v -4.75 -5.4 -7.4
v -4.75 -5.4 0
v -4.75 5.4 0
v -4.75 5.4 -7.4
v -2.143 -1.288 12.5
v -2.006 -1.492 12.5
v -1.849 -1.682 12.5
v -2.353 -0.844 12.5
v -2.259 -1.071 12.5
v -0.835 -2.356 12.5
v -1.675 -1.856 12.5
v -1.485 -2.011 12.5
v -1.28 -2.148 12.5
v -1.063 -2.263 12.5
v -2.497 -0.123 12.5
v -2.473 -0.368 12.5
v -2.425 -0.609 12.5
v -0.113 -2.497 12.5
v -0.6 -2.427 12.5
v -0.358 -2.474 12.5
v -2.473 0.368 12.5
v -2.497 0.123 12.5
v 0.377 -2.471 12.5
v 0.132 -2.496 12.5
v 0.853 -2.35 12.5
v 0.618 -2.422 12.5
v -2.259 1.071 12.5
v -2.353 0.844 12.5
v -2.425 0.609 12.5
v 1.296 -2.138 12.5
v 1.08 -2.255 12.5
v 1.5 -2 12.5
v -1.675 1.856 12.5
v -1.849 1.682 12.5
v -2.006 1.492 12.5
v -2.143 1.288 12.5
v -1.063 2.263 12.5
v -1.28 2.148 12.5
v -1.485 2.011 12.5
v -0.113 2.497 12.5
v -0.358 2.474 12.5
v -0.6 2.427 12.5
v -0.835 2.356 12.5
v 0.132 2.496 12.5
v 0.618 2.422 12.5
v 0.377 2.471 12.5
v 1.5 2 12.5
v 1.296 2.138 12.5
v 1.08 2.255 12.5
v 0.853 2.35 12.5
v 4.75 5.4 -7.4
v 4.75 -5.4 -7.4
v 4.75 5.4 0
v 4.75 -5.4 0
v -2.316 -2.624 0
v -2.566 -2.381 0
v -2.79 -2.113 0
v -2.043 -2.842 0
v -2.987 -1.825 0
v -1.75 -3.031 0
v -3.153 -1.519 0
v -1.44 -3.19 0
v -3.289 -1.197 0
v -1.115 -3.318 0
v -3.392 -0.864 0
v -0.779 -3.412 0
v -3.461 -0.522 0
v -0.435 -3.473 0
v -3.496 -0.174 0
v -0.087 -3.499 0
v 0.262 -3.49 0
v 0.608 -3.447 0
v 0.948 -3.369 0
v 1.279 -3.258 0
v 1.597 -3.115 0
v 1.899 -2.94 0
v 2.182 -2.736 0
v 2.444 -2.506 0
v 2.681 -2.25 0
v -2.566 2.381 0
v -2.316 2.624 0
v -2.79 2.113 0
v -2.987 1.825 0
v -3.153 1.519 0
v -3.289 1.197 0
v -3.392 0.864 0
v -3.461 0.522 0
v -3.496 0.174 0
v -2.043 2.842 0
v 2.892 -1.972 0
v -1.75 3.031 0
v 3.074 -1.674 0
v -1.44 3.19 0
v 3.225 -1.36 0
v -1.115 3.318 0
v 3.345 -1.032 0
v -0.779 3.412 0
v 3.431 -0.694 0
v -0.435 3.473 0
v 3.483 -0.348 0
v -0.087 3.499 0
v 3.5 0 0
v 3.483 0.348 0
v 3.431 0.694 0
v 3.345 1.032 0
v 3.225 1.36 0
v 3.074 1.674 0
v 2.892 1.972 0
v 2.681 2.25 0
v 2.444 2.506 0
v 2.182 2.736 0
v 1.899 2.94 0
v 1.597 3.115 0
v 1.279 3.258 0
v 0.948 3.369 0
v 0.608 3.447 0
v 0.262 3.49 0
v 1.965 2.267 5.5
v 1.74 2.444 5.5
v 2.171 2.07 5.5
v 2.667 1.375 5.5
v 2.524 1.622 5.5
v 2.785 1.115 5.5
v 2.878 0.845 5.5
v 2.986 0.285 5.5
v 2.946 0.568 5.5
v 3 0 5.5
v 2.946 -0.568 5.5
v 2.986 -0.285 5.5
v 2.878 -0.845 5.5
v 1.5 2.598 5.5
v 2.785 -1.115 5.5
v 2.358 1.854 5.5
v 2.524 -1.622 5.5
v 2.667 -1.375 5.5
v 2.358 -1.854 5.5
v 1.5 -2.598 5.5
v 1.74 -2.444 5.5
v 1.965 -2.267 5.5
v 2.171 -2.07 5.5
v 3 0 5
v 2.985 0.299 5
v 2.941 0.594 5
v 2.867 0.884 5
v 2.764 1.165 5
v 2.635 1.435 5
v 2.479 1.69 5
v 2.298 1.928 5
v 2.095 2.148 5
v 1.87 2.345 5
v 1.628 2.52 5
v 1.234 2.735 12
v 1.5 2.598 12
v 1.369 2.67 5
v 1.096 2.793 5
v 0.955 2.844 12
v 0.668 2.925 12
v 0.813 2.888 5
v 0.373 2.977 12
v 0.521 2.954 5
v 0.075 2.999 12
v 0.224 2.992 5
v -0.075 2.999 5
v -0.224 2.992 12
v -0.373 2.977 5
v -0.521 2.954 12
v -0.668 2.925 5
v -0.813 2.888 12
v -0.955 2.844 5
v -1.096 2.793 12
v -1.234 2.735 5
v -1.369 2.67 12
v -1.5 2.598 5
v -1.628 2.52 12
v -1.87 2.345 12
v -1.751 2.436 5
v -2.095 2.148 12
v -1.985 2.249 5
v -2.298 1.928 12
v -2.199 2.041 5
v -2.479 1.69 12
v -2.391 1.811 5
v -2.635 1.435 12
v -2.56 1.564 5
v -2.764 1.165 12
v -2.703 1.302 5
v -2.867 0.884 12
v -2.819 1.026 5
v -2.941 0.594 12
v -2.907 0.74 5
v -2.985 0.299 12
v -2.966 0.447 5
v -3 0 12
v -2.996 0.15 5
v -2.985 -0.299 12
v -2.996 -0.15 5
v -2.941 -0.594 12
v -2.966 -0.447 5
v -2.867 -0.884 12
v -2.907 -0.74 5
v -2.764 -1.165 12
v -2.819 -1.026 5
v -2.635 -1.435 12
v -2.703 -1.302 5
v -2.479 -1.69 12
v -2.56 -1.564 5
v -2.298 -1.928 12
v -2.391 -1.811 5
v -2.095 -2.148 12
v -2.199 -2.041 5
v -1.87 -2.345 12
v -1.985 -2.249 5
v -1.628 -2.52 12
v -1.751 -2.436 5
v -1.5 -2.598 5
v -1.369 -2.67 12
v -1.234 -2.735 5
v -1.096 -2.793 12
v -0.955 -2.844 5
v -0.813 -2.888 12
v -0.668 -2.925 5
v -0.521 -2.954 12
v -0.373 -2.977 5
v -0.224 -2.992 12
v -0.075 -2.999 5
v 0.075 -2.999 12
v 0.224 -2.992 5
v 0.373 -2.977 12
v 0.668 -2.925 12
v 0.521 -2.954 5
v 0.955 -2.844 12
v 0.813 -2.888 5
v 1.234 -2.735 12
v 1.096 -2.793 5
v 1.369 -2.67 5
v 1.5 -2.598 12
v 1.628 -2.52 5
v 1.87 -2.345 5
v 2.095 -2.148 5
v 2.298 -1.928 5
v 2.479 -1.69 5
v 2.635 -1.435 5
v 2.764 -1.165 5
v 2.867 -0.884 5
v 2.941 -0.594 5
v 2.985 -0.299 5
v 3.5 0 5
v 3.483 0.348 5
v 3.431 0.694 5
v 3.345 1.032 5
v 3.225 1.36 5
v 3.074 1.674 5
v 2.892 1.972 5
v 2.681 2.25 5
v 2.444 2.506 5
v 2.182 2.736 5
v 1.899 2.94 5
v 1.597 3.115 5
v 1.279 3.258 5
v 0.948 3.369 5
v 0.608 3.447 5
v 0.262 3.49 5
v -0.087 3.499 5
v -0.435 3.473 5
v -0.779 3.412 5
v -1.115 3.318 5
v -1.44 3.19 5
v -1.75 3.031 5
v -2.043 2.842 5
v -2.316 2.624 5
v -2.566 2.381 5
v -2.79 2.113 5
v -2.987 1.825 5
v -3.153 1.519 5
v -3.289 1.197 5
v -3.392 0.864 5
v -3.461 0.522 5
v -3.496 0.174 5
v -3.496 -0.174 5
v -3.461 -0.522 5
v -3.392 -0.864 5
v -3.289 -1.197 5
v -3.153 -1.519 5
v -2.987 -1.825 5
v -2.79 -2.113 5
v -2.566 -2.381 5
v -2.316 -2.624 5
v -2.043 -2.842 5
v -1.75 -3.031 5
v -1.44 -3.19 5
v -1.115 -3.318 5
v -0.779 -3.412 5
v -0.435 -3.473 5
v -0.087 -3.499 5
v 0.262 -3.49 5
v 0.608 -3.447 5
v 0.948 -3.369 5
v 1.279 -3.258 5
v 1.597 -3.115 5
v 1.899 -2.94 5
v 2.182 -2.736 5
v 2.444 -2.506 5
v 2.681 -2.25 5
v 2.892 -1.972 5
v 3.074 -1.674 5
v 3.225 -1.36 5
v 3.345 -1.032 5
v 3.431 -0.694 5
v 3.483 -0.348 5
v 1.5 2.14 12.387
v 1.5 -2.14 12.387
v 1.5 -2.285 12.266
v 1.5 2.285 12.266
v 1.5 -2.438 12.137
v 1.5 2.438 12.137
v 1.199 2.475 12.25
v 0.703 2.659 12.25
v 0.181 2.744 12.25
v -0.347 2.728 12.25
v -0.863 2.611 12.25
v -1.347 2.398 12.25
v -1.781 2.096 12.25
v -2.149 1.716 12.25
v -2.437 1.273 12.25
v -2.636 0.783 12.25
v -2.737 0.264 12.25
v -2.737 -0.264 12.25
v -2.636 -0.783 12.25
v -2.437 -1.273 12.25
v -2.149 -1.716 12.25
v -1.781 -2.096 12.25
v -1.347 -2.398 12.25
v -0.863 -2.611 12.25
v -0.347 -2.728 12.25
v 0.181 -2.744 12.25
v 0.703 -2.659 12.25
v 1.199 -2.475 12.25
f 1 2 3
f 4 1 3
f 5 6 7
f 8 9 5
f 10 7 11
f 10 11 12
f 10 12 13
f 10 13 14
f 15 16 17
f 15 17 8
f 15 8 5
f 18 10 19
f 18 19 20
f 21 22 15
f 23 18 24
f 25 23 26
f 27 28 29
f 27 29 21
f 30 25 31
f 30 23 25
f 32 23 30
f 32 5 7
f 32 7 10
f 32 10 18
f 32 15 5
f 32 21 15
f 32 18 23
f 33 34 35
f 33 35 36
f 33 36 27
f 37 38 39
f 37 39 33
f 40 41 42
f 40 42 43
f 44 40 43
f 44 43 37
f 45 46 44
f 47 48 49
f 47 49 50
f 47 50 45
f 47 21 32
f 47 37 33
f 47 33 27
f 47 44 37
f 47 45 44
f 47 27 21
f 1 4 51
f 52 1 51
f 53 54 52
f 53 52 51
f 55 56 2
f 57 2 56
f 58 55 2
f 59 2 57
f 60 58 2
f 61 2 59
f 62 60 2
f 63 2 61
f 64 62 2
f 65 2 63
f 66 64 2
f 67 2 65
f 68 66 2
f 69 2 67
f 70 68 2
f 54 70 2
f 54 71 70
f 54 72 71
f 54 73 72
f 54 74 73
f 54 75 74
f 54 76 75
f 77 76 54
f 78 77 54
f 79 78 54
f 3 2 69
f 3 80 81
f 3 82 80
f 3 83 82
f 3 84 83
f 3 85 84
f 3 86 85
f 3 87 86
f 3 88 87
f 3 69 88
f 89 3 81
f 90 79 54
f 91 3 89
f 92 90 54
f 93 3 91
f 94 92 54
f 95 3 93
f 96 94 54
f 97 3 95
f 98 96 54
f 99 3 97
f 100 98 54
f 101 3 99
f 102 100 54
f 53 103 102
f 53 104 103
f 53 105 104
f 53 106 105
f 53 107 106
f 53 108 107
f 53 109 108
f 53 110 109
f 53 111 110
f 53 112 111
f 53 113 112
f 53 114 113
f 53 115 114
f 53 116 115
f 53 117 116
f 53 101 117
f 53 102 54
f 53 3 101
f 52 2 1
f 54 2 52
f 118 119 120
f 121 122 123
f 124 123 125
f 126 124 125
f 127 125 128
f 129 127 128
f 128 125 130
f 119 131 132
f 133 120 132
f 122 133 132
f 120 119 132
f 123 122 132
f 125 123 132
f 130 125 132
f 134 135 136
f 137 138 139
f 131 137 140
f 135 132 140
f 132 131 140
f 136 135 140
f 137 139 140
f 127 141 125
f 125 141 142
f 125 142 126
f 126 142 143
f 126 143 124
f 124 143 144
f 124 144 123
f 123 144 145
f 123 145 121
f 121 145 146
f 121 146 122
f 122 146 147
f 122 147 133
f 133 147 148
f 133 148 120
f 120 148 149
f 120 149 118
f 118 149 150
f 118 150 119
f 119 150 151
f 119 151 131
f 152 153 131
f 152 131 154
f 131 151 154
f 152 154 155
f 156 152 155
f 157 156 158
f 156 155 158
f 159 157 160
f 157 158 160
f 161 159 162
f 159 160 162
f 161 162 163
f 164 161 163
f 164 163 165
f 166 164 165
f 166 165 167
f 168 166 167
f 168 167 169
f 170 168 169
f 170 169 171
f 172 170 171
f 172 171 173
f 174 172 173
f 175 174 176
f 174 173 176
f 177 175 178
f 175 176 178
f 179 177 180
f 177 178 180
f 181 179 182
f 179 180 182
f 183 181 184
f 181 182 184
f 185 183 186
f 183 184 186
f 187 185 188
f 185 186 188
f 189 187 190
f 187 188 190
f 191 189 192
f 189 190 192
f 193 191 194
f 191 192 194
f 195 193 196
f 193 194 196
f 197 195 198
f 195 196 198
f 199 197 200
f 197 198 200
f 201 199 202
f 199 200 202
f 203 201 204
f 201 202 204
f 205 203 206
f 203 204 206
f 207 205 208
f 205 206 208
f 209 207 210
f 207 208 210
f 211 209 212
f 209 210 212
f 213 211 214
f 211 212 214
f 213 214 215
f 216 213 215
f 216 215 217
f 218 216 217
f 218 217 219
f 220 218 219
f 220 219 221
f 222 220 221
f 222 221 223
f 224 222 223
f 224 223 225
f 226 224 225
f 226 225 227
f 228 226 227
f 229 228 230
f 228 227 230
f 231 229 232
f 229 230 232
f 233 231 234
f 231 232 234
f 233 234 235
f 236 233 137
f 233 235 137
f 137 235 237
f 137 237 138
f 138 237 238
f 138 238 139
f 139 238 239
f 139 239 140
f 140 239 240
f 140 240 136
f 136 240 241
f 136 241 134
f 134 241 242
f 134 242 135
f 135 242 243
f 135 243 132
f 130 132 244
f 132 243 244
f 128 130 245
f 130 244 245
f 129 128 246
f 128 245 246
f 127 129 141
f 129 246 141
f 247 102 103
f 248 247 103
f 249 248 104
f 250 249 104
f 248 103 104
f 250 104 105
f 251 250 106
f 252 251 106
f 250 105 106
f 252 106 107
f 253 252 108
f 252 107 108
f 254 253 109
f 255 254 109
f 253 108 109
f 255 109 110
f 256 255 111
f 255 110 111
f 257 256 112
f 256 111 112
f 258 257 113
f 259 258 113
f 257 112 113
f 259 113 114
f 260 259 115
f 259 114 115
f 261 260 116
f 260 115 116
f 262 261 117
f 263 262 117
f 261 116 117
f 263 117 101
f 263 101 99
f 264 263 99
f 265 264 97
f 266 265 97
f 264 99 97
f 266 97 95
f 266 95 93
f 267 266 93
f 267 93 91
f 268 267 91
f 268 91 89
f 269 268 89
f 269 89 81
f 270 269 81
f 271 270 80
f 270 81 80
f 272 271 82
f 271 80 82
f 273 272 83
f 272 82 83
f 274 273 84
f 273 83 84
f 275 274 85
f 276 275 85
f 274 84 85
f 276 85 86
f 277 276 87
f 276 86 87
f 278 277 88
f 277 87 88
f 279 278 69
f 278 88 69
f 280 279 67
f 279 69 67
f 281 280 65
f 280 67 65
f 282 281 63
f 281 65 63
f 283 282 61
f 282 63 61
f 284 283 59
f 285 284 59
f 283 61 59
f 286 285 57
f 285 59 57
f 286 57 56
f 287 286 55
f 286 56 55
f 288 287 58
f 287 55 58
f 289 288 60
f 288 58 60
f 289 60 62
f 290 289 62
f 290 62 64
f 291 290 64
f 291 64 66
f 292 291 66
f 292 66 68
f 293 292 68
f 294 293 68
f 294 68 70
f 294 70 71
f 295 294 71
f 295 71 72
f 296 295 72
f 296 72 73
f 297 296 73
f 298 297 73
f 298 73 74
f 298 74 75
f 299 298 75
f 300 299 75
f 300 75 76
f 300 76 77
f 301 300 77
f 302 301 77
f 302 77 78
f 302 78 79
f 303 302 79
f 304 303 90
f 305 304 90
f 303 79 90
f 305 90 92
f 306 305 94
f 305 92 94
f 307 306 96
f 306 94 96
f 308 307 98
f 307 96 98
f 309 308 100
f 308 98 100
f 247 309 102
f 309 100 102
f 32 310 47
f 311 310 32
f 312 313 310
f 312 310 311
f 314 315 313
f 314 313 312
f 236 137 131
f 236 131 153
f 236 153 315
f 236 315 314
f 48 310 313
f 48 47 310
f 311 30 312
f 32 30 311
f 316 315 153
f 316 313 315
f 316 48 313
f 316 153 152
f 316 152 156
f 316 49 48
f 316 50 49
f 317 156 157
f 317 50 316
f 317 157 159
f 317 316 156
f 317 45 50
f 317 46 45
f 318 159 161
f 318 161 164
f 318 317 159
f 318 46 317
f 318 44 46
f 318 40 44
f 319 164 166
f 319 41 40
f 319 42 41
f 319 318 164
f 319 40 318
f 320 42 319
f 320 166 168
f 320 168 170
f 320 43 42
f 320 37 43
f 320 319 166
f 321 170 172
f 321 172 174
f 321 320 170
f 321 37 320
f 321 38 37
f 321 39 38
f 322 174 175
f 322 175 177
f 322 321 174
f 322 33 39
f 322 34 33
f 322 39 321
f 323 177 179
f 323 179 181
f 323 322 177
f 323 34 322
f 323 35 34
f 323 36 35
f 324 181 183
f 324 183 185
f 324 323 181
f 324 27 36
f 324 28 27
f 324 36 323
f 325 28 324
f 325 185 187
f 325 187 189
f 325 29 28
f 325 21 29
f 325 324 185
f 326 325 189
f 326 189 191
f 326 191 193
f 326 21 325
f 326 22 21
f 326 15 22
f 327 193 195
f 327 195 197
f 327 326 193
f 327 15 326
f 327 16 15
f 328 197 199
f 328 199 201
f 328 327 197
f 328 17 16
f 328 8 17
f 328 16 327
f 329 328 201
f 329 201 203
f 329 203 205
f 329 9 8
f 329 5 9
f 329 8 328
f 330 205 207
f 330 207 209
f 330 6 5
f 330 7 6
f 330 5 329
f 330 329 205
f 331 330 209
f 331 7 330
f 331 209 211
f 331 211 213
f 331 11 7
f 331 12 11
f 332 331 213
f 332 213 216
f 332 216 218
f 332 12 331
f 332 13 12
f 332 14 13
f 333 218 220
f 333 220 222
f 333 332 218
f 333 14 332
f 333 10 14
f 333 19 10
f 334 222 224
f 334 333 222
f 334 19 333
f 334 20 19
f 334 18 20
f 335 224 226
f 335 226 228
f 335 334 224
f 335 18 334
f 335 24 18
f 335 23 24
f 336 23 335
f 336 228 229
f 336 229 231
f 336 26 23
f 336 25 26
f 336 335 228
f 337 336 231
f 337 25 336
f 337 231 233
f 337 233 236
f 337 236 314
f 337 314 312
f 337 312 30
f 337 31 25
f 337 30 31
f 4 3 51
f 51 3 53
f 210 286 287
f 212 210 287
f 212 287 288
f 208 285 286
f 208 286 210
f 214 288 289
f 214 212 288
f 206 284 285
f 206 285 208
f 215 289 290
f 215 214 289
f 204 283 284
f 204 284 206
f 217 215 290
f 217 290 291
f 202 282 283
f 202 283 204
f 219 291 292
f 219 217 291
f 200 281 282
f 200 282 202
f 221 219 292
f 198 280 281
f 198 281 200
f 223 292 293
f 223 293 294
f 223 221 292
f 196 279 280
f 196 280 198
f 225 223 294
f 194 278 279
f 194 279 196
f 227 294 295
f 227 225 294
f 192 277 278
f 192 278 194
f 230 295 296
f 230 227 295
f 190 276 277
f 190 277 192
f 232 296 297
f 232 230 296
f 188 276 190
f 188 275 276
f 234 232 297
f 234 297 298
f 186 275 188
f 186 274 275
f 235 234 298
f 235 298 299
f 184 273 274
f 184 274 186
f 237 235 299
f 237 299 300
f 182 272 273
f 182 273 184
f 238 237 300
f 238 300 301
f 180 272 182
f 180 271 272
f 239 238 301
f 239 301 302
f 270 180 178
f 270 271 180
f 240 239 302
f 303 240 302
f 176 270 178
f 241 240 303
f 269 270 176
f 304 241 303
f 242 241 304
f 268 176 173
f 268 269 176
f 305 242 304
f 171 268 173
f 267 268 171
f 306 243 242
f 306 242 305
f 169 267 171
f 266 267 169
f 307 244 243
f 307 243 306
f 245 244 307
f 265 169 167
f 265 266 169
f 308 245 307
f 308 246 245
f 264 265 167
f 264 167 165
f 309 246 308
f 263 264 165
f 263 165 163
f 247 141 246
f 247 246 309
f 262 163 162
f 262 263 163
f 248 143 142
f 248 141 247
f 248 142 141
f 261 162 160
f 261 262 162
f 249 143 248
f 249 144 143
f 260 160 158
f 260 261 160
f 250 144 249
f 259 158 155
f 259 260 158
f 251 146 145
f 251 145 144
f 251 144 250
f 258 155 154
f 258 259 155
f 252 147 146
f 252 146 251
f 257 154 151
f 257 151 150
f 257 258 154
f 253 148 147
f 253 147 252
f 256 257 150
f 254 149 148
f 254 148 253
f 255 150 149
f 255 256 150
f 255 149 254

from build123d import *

# Parameters (mm, degrees)
SKETCH_W     = 9.5
SKETCH_H     = 10.8
PAD_DEPTH    = 7.4
SKETCH001_R  = 3.5
PAD001_DEPTH = 5
SKETCH002_R  = 3
PAD002_DEPTH = 12.5
SKETCH003_W  = 1.5
SKETCH003_H  = 7
POCKET_DEPTH = 3
CHAMFER_SIZE = 0.5


with BuildPart() as part:
    # Sketch → Pad (new body)
    with BuildSketch(Plane.XY):
        Rectangle(SKETCH_W, SKETCH_H)
    extrude(amount=-PAD_DEPTH)

    # Sketch001 → Pad001 (join)
    with BuildSketch(Plane.XY):
        Circle(SKETCH001_R)
    extrude(amount=PAD001_DEPTH)

    # Sketch002 → Pad002 (join)
    with BuildSketch(Plane.XY):
        Circle(SKETCH002_R)
    extrude(amount=PAD002_DEPTH)

    # Sketch003 → Pocket (cut, symmetric)
    with BuildSketch(Plane.XZ):
        with Locations((2.25, 9)):
            Rectangle(SKETCH003_W, SKETCH003_H)
    extrude(amount=POCKET_DEPTH, both=True, mode=Mode.SUBTRACT)

    # Chamfer
    chamfer_edges = [part.edges().sort_by_distance(p)[0] for p in [
        (-3, 0, 12.5),
    ]]
    chamfer(chamfer_edges, length=CHAMFER_SIZE)


solid = part.part
